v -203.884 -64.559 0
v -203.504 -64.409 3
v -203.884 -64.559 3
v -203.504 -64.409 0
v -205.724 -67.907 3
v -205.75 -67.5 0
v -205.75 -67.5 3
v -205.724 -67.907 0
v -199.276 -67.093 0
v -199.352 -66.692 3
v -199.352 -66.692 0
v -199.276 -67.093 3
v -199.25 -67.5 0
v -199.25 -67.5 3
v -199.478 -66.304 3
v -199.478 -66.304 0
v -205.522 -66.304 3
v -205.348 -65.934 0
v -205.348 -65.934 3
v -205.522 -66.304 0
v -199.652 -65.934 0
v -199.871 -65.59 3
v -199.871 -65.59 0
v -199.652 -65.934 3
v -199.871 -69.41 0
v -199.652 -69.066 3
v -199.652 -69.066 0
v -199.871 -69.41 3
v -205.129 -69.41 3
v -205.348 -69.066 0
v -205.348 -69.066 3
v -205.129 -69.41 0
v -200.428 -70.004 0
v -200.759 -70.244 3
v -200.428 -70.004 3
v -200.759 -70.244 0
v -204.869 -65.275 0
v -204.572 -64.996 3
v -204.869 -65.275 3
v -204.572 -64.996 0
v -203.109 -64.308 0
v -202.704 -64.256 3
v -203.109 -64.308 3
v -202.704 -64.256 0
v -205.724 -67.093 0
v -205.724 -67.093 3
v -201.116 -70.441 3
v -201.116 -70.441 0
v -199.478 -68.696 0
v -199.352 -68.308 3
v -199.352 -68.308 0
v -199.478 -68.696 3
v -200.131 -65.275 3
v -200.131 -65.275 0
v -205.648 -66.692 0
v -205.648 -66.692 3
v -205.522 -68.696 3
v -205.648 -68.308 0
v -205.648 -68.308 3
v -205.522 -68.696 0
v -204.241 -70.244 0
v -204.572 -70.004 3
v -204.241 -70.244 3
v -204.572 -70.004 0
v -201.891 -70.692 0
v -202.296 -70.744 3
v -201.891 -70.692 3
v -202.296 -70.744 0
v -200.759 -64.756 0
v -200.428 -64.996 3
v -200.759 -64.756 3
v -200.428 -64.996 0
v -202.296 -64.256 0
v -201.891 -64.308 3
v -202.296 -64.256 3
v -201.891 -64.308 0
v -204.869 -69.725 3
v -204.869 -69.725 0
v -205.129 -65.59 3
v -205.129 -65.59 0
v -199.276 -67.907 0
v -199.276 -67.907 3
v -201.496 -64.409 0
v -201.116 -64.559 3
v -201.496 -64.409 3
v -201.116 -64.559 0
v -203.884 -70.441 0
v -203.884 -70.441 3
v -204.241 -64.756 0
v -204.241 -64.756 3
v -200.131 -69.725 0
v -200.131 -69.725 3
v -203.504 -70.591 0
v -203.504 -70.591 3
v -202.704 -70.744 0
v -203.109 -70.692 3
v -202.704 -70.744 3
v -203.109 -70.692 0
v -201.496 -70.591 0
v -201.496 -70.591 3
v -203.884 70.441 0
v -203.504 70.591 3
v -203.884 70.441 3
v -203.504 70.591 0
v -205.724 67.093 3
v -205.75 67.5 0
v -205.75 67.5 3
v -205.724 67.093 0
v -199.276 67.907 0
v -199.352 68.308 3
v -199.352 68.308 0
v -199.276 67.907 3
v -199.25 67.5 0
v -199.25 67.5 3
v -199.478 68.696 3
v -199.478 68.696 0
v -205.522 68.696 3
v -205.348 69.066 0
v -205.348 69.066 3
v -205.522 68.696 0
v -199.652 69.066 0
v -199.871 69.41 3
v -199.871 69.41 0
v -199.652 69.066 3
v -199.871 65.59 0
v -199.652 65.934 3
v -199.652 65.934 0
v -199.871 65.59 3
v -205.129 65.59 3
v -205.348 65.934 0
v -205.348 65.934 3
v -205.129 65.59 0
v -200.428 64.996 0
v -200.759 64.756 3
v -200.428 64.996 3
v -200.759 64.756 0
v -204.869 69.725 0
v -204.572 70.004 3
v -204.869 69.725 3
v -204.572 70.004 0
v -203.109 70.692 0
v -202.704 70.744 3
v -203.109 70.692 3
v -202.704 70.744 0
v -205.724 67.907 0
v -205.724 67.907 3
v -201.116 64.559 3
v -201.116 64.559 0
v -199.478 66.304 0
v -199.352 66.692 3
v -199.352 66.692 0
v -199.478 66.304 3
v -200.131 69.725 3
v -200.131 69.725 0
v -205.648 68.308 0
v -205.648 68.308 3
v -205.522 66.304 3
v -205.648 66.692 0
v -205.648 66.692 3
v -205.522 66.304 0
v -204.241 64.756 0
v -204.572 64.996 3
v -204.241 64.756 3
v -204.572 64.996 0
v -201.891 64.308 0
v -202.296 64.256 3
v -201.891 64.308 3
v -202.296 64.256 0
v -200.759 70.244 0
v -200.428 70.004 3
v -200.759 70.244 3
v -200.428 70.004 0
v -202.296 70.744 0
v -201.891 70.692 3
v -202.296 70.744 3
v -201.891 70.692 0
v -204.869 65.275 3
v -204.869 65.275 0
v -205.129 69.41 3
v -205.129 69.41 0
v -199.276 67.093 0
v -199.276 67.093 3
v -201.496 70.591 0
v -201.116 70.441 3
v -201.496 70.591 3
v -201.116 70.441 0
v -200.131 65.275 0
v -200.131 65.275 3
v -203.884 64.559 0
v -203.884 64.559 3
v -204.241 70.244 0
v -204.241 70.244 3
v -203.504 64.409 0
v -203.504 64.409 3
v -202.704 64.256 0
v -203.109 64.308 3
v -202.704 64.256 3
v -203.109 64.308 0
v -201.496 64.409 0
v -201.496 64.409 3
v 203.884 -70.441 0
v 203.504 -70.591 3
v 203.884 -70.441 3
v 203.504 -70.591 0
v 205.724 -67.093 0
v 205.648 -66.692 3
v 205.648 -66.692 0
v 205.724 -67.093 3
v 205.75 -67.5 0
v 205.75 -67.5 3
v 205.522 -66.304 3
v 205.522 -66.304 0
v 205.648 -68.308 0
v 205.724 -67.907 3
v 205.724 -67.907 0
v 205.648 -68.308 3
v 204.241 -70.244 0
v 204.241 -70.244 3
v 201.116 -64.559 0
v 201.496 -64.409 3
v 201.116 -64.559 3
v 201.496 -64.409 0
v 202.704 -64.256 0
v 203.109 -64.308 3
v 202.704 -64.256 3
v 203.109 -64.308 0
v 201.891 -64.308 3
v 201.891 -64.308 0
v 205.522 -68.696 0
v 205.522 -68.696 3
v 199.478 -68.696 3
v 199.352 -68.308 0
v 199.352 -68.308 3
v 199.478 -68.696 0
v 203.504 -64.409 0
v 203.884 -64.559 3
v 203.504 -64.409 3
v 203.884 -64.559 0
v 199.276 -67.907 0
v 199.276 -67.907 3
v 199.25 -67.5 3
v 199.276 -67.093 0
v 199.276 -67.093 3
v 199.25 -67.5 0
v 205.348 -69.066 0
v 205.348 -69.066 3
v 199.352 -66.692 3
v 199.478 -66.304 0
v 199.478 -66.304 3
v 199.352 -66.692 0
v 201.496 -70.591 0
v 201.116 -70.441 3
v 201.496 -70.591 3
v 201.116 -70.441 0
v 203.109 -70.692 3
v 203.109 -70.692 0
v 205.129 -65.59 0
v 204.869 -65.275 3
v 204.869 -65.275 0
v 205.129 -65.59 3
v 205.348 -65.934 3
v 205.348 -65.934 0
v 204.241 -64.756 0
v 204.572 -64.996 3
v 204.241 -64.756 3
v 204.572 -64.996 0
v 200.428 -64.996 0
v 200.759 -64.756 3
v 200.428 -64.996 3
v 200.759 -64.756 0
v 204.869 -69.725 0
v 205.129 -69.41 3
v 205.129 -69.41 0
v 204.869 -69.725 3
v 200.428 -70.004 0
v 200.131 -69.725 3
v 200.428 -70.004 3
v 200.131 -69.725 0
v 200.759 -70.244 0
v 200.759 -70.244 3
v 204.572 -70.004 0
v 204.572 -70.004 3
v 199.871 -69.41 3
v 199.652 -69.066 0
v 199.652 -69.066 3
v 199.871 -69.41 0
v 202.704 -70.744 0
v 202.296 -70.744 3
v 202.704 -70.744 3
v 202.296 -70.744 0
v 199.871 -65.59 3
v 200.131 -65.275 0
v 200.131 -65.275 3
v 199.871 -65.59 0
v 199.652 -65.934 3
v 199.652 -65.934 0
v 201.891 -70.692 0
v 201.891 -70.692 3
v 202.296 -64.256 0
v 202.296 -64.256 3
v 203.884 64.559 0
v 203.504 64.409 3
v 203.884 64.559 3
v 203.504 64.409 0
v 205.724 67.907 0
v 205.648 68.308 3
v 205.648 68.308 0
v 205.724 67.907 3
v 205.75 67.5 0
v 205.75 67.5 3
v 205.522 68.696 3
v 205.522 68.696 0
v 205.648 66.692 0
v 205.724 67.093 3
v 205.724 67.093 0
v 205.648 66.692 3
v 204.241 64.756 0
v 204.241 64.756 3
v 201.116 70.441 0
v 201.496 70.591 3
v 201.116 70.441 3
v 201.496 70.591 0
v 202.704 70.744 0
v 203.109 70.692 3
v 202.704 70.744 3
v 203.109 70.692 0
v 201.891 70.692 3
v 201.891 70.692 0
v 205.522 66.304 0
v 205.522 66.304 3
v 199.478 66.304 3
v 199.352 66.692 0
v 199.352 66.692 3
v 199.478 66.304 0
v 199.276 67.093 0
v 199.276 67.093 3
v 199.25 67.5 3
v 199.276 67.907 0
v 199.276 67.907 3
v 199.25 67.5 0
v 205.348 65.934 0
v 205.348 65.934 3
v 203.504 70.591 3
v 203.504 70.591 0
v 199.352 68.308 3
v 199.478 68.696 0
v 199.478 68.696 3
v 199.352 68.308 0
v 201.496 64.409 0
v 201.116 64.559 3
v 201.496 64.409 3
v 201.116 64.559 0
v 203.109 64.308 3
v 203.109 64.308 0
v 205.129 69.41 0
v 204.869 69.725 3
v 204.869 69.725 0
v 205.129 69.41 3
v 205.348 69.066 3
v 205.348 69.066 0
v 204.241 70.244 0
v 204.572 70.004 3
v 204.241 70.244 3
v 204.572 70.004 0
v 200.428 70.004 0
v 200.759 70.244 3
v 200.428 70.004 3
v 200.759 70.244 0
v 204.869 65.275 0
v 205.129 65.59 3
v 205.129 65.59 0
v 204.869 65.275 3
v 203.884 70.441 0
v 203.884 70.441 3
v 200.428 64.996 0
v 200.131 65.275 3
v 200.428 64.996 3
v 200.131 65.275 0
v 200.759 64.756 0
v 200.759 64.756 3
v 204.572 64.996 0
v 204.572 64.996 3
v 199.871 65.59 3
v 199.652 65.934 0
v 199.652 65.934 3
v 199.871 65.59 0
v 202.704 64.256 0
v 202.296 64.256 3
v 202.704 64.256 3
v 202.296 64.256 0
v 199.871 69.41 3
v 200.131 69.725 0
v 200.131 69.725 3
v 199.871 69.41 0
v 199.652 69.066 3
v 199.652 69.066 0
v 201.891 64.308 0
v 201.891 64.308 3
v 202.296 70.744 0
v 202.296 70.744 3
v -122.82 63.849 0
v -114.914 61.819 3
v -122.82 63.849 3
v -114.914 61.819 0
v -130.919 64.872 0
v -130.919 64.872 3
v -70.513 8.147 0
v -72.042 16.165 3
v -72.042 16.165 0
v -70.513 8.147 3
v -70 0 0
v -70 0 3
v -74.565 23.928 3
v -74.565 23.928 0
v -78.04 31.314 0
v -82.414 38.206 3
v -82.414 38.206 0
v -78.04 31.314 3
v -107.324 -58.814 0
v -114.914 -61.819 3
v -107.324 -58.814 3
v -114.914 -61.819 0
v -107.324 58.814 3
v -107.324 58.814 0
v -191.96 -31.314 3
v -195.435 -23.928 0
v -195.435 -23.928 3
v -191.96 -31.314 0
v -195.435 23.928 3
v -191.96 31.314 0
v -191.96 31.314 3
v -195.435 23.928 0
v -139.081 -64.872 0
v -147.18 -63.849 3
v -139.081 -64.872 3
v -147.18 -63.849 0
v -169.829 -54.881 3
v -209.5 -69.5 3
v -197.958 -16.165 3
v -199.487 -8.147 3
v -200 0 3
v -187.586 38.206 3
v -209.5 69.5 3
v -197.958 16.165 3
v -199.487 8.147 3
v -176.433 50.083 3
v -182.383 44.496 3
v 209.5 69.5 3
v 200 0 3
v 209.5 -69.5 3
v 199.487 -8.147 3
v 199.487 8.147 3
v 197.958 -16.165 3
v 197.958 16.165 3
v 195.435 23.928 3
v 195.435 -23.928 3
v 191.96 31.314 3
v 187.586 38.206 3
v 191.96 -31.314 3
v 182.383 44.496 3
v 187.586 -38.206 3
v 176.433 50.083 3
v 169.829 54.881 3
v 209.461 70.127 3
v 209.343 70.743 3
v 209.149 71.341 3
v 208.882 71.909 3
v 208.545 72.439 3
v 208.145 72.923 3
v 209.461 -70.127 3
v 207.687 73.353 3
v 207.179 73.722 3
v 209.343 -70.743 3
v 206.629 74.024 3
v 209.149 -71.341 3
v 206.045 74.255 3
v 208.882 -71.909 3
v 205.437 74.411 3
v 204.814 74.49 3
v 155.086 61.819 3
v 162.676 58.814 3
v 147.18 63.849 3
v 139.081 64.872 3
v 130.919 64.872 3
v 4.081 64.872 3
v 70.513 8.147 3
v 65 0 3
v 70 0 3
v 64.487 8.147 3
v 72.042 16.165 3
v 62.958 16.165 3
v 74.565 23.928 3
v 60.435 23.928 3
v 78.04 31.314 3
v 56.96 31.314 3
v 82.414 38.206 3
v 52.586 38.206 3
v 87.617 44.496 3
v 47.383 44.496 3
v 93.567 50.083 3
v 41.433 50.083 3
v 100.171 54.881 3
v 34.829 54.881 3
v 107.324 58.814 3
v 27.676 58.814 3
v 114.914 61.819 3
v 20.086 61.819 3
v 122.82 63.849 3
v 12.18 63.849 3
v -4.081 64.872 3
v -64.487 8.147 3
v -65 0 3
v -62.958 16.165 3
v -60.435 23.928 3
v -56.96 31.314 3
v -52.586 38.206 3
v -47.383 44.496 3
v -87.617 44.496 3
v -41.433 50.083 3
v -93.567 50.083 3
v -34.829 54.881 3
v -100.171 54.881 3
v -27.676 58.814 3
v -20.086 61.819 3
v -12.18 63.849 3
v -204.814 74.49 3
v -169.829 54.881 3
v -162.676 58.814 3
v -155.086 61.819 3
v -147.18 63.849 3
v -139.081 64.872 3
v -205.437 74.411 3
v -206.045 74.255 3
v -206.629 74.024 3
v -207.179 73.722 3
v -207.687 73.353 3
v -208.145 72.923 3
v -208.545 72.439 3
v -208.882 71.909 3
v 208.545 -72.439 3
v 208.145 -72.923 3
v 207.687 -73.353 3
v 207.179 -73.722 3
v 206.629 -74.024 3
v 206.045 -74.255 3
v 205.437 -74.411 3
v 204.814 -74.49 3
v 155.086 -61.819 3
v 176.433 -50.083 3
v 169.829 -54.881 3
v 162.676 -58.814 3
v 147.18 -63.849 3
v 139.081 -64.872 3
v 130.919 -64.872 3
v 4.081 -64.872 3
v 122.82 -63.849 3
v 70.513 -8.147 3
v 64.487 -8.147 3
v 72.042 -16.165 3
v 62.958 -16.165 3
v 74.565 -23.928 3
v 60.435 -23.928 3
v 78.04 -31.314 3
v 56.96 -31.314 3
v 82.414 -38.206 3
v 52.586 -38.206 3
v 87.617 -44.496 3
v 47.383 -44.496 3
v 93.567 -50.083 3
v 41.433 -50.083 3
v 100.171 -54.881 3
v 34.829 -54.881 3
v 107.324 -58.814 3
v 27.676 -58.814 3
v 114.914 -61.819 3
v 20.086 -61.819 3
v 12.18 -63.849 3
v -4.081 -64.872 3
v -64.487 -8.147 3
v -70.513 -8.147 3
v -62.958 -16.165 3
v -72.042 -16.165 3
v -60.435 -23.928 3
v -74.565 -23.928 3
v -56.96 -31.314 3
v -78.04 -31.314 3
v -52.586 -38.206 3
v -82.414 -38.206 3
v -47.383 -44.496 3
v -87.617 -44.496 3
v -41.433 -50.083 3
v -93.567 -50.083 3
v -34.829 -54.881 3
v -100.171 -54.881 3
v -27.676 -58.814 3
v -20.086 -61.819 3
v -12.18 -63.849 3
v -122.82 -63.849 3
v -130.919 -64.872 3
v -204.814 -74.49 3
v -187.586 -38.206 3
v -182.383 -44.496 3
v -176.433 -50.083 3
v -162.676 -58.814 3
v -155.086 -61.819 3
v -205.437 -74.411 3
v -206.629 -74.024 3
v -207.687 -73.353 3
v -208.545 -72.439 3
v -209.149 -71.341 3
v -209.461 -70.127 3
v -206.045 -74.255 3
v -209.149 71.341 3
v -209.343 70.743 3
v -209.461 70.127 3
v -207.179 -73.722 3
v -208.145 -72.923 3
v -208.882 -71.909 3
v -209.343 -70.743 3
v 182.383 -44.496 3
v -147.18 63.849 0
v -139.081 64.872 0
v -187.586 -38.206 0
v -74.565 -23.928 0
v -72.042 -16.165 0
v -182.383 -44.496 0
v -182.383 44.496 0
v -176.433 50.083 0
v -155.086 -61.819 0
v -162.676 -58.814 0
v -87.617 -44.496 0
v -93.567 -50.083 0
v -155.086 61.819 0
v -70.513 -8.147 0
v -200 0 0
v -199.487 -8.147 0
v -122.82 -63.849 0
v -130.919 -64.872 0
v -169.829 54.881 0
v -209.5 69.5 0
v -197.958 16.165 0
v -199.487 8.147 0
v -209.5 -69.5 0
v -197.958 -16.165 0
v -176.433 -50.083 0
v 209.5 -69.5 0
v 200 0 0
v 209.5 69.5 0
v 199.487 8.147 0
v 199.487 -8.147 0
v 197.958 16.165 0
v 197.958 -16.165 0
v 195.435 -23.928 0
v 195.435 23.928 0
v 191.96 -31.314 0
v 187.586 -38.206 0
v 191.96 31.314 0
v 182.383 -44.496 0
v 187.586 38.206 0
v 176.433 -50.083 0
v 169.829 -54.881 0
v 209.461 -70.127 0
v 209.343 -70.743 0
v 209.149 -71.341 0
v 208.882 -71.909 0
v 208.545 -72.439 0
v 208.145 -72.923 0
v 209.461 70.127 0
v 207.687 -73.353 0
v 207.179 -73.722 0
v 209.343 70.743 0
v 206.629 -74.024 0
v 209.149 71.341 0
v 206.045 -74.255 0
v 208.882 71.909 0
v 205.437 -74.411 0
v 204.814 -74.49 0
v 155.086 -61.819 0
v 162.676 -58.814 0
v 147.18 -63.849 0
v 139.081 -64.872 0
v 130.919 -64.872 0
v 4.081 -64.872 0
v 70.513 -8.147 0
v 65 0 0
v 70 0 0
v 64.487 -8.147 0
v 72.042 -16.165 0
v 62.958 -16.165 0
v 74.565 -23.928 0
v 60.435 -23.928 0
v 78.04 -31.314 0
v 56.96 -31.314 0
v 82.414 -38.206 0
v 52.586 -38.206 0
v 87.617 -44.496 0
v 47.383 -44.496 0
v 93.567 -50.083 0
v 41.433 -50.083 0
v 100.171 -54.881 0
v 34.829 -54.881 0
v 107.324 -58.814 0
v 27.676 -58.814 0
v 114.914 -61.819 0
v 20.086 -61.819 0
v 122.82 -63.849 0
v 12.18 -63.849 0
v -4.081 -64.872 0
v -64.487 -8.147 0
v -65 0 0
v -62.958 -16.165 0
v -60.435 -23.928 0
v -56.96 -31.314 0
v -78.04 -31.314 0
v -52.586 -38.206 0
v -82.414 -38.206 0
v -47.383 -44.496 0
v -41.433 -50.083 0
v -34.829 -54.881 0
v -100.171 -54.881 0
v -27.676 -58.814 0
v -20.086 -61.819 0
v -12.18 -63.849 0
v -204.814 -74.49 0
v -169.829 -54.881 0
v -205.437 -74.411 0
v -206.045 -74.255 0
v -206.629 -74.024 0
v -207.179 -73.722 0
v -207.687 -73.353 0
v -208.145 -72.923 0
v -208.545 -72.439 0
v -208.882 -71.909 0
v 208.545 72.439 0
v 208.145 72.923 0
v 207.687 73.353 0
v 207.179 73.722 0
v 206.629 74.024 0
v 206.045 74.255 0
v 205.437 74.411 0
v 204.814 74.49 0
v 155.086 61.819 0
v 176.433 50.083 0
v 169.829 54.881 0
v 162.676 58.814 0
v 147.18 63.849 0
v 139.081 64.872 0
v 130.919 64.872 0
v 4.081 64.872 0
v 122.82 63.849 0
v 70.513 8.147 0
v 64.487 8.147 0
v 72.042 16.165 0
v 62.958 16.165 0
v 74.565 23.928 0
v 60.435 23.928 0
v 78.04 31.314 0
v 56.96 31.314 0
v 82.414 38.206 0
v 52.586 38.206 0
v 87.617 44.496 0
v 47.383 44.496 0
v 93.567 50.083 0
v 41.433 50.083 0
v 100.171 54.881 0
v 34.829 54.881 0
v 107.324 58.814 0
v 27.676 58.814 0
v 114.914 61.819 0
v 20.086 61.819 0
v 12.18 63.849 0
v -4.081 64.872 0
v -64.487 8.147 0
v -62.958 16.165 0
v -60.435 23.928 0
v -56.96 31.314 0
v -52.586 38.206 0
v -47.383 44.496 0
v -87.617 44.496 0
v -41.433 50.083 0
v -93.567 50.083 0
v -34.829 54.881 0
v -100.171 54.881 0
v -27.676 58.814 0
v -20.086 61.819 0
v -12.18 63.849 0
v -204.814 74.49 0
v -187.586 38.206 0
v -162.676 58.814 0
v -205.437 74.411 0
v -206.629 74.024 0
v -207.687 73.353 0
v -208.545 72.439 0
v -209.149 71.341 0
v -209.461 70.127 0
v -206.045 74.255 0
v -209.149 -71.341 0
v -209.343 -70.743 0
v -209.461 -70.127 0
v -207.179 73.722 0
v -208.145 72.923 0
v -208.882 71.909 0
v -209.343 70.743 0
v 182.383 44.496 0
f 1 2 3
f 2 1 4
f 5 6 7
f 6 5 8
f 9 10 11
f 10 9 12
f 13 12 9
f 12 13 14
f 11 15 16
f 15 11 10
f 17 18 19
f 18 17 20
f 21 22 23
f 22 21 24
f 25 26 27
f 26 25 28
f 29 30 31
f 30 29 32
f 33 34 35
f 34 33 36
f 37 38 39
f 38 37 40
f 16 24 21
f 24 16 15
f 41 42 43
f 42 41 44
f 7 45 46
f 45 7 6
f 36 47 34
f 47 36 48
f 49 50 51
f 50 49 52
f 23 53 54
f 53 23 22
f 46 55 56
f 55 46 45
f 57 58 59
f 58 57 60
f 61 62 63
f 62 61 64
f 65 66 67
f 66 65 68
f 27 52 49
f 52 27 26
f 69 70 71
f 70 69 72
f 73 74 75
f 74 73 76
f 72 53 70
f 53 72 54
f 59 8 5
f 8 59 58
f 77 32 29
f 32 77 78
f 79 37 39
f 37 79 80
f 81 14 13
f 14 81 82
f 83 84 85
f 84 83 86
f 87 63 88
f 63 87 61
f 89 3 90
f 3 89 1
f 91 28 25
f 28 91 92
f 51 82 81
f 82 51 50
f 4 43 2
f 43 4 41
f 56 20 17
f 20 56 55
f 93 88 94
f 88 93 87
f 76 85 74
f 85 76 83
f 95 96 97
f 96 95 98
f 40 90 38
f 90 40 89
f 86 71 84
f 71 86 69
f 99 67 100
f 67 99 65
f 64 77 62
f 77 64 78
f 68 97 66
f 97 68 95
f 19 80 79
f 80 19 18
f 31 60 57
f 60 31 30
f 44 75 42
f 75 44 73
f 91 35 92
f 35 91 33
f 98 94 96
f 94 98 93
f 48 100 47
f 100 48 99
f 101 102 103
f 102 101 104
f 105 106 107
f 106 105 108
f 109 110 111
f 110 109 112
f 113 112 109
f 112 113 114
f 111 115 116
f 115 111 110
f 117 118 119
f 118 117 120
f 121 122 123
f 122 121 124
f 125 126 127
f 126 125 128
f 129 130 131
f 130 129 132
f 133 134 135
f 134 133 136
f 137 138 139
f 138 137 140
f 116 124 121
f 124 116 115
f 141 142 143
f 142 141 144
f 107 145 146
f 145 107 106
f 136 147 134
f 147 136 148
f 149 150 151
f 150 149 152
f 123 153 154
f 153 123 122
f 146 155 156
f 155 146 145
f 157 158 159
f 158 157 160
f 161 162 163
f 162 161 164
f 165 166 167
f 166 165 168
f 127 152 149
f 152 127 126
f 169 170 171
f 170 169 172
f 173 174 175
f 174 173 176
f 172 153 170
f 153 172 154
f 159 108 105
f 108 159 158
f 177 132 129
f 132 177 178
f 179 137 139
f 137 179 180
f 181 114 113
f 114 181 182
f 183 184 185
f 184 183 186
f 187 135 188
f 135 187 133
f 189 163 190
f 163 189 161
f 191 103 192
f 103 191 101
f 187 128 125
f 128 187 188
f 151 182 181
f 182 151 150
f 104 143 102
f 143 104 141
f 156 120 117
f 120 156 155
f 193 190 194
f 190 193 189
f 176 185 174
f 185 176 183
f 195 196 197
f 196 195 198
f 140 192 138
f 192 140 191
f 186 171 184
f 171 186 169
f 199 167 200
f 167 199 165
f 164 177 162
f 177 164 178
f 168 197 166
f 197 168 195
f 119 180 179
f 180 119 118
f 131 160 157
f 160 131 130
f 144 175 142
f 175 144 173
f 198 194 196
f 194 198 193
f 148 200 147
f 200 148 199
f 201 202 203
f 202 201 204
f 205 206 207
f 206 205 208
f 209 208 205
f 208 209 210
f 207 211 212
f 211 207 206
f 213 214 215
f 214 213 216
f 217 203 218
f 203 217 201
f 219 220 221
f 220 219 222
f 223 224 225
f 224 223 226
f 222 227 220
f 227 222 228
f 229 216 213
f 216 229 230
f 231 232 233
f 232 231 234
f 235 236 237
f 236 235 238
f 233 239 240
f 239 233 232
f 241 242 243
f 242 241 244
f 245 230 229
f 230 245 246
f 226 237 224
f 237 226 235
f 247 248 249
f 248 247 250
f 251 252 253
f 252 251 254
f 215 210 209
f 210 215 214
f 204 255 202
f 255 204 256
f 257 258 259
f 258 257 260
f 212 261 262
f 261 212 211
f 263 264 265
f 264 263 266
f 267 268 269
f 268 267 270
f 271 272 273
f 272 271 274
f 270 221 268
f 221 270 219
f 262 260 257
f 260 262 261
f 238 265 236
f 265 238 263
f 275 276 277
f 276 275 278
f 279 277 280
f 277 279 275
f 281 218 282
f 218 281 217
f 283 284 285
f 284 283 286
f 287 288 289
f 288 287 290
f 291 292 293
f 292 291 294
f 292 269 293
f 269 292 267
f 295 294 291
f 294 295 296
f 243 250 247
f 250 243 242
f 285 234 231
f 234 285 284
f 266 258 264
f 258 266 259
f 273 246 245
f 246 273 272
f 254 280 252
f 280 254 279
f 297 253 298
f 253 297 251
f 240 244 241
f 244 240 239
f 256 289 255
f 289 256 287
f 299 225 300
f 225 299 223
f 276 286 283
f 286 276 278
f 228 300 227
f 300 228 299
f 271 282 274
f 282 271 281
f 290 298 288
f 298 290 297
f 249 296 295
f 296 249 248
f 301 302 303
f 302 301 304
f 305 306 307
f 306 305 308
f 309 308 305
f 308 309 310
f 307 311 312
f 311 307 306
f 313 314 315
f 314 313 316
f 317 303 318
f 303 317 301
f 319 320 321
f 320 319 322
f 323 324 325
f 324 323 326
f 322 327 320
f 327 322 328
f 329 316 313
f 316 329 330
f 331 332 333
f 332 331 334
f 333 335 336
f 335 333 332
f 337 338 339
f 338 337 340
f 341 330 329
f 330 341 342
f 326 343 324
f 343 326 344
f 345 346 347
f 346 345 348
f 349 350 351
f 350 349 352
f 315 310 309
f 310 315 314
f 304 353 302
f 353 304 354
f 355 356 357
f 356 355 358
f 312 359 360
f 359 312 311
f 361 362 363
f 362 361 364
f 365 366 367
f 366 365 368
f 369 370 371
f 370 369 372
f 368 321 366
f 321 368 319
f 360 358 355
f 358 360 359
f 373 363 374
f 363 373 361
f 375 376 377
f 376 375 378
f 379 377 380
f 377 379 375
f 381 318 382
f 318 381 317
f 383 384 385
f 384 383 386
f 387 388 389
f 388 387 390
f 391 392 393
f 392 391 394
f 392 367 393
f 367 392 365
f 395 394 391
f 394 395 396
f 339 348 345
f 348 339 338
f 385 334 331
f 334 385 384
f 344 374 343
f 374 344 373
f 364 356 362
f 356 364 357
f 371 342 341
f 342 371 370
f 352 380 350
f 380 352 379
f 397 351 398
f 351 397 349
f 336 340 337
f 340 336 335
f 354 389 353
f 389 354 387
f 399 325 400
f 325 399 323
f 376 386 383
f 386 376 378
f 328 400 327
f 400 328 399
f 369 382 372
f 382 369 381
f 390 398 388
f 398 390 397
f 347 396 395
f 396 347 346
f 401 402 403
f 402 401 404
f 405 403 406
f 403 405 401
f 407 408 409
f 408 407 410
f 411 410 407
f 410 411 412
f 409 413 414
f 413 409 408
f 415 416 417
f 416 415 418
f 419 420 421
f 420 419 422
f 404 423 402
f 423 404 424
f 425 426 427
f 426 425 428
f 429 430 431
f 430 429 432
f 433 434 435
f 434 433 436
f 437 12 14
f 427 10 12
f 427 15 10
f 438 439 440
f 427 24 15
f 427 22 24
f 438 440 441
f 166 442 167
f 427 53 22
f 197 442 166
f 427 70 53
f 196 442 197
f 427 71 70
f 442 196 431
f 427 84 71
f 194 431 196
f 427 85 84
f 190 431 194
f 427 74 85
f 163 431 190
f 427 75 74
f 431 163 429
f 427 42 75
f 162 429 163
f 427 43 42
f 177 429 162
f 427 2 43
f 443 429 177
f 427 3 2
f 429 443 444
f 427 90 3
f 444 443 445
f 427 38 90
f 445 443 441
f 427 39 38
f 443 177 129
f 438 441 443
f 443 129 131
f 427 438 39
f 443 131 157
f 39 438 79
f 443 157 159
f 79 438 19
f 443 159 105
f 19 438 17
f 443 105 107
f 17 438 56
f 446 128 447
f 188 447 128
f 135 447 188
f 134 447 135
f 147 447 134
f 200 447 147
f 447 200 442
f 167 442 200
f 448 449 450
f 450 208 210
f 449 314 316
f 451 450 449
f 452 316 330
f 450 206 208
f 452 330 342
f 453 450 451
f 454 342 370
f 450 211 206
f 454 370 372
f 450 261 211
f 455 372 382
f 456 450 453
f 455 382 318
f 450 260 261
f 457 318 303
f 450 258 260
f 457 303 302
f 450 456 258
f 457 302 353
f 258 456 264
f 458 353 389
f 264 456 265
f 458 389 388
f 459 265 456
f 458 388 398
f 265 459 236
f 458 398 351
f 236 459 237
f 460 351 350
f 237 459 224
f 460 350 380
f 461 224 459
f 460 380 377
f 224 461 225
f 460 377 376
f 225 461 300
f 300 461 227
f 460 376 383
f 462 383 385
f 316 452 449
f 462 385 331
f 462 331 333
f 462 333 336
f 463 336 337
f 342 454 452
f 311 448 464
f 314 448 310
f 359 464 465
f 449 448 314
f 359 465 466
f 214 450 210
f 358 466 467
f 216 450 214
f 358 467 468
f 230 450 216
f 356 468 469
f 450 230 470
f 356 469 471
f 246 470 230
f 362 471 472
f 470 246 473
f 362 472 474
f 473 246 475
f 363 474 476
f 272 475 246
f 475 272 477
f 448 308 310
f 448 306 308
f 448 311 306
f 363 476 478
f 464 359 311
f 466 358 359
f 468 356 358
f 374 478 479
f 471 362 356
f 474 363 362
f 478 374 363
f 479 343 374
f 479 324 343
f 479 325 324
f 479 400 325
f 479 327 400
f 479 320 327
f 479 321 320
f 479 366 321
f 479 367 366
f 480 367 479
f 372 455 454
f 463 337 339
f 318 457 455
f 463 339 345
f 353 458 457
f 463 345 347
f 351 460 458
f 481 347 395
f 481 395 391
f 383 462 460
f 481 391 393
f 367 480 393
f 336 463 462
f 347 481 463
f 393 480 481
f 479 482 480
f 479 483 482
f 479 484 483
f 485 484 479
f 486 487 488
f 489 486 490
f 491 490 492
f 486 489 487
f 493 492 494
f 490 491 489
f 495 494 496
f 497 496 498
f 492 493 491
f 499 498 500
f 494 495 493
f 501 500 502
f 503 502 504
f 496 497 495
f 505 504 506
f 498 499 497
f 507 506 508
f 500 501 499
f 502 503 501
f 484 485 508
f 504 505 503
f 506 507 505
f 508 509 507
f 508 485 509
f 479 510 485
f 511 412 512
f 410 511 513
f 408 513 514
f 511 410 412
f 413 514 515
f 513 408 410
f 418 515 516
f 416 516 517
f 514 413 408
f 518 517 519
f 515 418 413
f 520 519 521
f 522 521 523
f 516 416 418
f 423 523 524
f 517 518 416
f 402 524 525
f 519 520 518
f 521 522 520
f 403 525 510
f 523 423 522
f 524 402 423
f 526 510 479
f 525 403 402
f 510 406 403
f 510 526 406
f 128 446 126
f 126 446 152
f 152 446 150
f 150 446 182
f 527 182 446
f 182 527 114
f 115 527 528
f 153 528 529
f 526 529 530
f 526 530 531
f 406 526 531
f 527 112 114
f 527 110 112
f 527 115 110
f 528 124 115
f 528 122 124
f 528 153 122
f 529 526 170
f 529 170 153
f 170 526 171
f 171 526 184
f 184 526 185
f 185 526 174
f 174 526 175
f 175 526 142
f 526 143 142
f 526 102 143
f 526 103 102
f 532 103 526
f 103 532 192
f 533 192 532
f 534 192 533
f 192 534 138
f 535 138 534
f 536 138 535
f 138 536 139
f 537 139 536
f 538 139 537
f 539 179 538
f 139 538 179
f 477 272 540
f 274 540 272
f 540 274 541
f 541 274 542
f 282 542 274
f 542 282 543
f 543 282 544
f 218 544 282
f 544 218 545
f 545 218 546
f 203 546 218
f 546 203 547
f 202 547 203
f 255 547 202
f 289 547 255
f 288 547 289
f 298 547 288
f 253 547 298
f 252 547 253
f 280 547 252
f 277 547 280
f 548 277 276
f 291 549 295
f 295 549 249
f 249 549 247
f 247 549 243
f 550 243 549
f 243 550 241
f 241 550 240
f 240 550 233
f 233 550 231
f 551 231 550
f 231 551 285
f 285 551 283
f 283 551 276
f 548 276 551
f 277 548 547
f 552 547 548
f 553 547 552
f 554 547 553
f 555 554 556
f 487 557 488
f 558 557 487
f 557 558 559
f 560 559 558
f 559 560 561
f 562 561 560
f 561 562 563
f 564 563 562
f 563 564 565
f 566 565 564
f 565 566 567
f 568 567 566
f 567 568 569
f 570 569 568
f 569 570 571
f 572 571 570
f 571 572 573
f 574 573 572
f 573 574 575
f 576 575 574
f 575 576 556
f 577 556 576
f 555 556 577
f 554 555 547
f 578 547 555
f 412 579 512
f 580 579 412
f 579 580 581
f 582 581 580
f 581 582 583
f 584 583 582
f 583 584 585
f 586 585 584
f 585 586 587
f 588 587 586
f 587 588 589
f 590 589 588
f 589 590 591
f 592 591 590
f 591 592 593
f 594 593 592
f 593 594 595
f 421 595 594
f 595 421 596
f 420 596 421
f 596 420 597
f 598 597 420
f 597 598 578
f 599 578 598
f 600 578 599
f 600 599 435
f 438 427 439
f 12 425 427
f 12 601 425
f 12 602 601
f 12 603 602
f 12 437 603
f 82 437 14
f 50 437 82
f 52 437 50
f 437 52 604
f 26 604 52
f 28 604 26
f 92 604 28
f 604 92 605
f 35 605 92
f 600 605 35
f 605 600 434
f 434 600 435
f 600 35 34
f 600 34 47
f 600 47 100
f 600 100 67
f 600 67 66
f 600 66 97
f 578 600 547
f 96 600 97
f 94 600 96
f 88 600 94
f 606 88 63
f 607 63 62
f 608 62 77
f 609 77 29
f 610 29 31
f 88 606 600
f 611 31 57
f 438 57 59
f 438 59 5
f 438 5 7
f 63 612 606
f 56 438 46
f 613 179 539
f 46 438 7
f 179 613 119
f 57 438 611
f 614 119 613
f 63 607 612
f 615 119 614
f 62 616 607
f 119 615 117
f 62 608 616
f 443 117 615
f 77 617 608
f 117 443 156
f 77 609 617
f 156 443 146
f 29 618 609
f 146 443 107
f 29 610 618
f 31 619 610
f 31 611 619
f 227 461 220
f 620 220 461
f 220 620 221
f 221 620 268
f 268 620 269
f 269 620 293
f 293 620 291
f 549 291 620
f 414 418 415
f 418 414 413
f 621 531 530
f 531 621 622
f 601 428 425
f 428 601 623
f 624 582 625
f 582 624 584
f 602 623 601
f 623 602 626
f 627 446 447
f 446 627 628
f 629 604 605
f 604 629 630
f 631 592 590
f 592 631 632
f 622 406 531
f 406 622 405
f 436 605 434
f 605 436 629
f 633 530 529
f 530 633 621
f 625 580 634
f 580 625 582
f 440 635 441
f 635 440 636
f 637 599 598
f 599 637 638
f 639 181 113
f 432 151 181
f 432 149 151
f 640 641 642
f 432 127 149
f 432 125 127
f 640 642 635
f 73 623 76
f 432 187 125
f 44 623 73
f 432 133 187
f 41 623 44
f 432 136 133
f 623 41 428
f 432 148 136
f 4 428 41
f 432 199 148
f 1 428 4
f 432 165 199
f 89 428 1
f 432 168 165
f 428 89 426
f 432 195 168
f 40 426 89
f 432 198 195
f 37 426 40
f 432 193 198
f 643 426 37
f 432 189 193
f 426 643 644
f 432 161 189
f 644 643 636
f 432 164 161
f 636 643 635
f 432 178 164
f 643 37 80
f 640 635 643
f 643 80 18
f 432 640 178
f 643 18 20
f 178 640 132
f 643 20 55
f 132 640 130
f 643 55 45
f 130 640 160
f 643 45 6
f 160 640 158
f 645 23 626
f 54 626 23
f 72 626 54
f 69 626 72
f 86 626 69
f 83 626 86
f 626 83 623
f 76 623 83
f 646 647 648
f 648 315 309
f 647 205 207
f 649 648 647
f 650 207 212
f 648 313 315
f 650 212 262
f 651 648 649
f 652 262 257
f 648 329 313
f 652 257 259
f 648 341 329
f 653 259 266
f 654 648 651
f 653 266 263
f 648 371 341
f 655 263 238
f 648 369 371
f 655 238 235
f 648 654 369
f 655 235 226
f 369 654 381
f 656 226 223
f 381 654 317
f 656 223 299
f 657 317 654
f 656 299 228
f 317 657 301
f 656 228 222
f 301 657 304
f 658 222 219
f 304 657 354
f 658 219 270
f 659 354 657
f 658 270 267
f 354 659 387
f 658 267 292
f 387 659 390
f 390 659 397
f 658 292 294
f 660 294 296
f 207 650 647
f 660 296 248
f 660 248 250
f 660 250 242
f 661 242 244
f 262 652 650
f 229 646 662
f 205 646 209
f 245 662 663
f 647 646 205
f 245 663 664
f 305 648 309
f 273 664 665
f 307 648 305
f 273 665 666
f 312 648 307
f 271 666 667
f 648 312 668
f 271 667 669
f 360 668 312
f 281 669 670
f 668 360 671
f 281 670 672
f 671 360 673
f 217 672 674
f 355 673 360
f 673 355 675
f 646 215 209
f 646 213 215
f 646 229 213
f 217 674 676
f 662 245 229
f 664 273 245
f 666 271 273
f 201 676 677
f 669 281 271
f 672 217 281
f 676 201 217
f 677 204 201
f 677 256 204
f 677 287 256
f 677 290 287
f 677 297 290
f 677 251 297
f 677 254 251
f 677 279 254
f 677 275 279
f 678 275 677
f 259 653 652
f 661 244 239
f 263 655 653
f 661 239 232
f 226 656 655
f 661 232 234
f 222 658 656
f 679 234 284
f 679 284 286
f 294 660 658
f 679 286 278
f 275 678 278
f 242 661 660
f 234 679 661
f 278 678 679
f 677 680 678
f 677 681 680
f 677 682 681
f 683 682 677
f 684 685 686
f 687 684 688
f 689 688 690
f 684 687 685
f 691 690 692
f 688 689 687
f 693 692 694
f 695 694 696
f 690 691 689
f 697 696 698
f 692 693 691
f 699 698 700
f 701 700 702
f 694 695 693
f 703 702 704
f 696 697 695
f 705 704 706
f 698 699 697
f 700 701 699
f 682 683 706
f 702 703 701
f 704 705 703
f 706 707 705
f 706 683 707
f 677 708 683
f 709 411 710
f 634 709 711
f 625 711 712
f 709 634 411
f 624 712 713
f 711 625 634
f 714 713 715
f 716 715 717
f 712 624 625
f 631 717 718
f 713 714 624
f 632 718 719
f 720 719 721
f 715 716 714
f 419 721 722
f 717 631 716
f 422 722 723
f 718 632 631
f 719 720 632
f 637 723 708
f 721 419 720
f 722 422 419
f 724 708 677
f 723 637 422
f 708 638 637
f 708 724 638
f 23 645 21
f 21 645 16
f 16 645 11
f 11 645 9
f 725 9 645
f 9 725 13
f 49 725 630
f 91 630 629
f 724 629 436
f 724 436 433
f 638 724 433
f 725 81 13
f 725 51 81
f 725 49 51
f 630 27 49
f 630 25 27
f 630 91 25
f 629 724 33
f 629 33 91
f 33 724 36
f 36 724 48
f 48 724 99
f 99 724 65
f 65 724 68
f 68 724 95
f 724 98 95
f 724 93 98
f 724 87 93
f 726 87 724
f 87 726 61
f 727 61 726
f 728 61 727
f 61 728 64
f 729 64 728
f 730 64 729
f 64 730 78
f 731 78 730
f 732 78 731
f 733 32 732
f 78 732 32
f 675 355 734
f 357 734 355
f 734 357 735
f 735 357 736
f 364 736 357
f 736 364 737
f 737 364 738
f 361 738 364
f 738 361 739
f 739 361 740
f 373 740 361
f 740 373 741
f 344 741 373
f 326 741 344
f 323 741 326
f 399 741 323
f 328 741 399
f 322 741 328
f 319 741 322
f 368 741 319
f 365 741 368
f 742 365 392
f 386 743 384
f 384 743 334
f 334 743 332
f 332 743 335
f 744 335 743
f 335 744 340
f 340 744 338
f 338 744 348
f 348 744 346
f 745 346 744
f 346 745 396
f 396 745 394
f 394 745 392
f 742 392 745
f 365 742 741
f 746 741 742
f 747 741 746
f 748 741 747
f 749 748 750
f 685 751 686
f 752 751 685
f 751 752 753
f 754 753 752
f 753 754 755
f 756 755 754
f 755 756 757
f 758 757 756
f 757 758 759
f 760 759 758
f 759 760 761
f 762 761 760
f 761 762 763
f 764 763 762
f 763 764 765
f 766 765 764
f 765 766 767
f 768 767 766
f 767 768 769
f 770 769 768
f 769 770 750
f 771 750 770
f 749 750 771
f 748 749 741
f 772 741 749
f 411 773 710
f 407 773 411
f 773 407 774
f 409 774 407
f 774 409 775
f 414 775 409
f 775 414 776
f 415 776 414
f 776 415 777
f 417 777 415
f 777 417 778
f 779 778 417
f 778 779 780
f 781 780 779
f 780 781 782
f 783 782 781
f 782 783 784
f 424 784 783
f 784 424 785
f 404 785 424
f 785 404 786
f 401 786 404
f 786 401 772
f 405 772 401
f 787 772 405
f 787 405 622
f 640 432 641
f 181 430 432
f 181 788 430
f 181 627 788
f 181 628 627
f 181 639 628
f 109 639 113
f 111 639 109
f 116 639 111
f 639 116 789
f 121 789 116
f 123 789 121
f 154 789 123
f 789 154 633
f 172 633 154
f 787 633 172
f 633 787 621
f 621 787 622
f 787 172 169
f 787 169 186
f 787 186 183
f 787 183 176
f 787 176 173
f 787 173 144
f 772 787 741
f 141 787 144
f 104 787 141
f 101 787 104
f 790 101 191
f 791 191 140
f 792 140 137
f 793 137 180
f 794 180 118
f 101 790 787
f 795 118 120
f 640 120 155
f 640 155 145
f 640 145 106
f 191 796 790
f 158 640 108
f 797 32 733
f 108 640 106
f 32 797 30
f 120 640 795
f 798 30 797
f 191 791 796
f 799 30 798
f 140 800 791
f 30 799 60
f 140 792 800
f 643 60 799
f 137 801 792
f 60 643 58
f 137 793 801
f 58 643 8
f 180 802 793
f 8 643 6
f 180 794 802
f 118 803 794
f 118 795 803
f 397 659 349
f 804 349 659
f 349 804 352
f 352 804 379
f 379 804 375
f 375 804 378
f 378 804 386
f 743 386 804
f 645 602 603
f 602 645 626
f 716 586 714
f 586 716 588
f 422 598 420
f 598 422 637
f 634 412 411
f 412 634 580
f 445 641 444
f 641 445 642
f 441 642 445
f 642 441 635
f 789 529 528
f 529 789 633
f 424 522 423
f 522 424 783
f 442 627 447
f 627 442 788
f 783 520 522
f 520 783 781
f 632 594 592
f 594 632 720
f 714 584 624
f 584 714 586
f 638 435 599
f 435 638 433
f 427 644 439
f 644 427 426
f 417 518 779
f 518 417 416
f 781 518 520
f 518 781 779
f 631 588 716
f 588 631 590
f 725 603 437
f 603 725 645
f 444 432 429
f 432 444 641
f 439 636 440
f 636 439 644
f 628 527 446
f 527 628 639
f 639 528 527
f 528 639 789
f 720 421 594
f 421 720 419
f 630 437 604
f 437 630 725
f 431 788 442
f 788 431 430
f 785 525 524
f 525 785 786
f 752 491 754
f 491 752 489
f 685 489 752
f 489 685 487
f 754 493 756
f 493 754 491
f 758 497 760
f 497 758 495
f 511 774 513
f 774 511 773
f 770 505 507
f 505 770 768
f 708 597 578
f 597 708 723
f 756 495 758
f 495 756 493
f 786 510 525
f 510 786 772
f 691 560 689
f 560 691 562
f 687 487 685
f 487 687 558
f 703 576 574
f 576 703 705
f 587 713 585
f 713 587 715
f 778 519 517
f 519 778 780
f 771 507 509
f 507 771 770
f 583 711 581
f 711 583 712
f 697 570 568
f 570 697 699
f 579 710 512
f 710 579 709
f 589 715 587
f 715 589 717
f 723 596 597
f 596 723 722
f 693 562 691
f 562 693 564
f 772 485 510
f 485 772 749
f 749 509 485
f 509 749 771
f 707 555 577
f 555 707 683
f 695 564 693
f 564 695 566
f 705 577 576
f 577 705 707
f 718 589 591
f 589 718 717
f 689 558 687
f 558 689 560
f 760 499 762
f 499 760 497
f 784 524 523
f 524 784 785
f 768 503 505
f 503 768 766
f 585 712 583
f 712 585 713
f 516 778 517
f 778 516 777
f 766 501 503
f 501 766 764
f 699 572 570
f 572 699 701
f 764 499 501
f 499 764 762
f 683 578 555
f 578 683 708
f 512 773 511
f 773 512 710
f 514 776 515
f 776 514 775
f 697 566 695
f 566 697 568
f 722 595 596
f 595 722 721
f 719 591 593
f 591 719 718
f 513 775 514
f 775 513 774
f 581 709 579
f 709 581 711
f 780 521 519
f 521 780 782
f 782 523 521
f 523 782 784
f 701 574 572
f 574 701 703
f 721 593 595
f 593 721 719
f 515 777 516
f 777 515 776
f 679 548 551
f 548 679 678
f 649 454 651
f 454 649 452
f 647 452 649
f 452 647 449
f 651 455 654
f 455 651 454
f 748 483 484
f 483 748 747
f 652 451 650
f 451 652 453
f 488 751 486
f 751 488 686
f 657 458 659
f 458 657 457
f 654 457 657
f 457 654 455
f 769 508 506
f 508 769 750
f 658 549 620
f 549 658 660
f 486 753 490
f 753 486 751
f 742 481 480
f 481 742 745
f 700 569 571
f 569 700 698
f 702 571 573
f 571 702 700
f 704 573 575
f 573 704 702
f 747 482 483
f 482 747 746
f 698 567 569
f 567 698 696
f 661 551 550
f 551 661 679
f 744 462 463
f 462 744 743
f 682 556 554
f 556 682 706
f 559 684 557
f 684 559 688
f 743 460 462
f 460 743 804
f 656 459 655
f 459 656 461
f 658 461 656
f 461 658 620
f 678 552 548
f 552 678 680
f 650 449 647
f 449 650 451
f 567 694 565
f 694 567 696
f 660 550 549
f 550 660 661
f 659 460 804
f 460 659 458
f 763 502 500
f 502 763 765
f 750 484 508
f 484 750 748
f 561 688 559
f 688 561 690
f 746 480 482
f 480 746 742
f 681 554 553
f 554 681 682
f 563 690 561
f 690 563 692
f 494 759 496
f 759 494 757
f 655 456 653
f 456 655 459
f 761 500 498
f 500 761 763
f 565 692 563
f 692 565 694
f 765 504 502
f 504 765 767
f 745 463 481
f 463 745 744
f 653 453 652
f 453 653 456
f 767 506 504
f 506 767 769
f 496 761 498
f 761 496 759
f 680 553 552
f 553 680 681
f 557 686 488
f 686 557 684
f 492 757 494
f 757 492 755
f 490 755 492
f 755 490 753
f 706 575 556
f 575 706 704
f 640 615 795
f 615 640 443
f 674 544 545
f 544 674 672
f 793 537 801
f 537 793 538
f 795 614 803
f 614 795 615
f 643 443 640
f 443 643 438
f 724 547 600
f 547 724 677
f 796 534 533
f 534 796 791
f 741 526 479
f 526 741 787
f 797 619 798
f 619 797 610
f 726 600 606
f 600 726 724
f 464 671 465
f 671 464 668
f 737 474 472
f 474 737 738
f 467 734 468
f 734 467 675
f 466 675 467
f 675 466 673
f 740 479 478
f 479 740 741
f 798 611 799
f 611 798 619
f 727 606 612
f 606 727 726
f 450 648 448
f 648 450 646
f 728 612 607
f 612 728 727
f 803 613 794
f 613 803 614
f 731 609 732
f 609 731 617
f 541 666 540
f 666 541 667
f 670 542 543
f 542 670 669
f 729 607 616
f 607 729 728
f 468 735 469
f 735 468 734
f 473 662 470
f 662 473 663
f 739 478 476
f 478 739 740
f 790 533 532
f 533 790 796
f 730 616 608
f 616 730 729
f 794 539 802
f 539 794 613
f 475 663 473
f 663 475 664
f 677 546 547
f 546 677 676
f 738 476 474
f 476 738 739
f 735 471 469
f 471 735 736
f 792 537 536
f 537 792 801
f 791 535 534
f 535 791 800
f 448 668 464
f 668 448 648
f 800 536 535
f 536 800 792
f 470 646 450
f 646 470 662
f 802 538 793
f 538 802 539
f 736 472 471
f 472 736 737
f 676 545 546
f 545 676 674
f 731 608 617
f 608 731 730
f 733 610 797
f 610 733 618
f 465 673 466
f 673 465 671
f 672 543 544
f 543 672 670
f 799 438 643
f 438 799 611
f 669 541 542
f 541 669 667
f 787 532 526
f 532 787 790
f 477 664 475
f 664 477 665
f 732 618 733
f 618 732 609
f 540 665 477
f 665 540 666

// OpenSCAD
$fn = 50;


difference() {
	union() {
		hull() {
			translate(v = [-204.5000000000, 69.5000000000, 0]) {
				cylinder(h = 3, r = 5);
			}
			translate(v = [204.5000000000, 69.5000000000, 0]) {
				cylinder(h = 3, r = 5);
			}
			translate(v = [-204.5000000000, -69.5000000000, 0]) {
				cylinder(h = 3, r = 5);
			}
			translate(v = [204.5000000000, -69.5000000000, 0]) {
				cylinder(h = 3, r = 5);
			}
		}
	}
	union() {
		#translate(v = [-202.5000000000, -67.5000000000, -100.0000000000]) {
			cylinder(h = 200, r = 3.2500000000);
		}
		#translate(v = [-202.5000000000, 67.5000000000, -100.0000000000]) {
			cylinder(h = 200, r = 3.2500000000);
		}
		#translate(v = [202.5000000000, -67.5000000000, -100.0000000000]) {
			cylinder(h = 200, r = 3.2500000000);
		}
		#translate(v = [202.5000000000, 67.5000000000, -100.0000000000]) {
			cylinder(h = 200, r = 3.2500000000);
		}
		#translate(v = [-135.0000000000, 0, 0]) {
			cylinder(h = 3, r = 65.0000000000);
		}
		#cylinder(h = 3, r = 65.0000000000);
		#translate(v = [135.0000000000, 0, 0]) {
			cylinder(h = 3, r = 65.0000000000);
		}
	}
}
